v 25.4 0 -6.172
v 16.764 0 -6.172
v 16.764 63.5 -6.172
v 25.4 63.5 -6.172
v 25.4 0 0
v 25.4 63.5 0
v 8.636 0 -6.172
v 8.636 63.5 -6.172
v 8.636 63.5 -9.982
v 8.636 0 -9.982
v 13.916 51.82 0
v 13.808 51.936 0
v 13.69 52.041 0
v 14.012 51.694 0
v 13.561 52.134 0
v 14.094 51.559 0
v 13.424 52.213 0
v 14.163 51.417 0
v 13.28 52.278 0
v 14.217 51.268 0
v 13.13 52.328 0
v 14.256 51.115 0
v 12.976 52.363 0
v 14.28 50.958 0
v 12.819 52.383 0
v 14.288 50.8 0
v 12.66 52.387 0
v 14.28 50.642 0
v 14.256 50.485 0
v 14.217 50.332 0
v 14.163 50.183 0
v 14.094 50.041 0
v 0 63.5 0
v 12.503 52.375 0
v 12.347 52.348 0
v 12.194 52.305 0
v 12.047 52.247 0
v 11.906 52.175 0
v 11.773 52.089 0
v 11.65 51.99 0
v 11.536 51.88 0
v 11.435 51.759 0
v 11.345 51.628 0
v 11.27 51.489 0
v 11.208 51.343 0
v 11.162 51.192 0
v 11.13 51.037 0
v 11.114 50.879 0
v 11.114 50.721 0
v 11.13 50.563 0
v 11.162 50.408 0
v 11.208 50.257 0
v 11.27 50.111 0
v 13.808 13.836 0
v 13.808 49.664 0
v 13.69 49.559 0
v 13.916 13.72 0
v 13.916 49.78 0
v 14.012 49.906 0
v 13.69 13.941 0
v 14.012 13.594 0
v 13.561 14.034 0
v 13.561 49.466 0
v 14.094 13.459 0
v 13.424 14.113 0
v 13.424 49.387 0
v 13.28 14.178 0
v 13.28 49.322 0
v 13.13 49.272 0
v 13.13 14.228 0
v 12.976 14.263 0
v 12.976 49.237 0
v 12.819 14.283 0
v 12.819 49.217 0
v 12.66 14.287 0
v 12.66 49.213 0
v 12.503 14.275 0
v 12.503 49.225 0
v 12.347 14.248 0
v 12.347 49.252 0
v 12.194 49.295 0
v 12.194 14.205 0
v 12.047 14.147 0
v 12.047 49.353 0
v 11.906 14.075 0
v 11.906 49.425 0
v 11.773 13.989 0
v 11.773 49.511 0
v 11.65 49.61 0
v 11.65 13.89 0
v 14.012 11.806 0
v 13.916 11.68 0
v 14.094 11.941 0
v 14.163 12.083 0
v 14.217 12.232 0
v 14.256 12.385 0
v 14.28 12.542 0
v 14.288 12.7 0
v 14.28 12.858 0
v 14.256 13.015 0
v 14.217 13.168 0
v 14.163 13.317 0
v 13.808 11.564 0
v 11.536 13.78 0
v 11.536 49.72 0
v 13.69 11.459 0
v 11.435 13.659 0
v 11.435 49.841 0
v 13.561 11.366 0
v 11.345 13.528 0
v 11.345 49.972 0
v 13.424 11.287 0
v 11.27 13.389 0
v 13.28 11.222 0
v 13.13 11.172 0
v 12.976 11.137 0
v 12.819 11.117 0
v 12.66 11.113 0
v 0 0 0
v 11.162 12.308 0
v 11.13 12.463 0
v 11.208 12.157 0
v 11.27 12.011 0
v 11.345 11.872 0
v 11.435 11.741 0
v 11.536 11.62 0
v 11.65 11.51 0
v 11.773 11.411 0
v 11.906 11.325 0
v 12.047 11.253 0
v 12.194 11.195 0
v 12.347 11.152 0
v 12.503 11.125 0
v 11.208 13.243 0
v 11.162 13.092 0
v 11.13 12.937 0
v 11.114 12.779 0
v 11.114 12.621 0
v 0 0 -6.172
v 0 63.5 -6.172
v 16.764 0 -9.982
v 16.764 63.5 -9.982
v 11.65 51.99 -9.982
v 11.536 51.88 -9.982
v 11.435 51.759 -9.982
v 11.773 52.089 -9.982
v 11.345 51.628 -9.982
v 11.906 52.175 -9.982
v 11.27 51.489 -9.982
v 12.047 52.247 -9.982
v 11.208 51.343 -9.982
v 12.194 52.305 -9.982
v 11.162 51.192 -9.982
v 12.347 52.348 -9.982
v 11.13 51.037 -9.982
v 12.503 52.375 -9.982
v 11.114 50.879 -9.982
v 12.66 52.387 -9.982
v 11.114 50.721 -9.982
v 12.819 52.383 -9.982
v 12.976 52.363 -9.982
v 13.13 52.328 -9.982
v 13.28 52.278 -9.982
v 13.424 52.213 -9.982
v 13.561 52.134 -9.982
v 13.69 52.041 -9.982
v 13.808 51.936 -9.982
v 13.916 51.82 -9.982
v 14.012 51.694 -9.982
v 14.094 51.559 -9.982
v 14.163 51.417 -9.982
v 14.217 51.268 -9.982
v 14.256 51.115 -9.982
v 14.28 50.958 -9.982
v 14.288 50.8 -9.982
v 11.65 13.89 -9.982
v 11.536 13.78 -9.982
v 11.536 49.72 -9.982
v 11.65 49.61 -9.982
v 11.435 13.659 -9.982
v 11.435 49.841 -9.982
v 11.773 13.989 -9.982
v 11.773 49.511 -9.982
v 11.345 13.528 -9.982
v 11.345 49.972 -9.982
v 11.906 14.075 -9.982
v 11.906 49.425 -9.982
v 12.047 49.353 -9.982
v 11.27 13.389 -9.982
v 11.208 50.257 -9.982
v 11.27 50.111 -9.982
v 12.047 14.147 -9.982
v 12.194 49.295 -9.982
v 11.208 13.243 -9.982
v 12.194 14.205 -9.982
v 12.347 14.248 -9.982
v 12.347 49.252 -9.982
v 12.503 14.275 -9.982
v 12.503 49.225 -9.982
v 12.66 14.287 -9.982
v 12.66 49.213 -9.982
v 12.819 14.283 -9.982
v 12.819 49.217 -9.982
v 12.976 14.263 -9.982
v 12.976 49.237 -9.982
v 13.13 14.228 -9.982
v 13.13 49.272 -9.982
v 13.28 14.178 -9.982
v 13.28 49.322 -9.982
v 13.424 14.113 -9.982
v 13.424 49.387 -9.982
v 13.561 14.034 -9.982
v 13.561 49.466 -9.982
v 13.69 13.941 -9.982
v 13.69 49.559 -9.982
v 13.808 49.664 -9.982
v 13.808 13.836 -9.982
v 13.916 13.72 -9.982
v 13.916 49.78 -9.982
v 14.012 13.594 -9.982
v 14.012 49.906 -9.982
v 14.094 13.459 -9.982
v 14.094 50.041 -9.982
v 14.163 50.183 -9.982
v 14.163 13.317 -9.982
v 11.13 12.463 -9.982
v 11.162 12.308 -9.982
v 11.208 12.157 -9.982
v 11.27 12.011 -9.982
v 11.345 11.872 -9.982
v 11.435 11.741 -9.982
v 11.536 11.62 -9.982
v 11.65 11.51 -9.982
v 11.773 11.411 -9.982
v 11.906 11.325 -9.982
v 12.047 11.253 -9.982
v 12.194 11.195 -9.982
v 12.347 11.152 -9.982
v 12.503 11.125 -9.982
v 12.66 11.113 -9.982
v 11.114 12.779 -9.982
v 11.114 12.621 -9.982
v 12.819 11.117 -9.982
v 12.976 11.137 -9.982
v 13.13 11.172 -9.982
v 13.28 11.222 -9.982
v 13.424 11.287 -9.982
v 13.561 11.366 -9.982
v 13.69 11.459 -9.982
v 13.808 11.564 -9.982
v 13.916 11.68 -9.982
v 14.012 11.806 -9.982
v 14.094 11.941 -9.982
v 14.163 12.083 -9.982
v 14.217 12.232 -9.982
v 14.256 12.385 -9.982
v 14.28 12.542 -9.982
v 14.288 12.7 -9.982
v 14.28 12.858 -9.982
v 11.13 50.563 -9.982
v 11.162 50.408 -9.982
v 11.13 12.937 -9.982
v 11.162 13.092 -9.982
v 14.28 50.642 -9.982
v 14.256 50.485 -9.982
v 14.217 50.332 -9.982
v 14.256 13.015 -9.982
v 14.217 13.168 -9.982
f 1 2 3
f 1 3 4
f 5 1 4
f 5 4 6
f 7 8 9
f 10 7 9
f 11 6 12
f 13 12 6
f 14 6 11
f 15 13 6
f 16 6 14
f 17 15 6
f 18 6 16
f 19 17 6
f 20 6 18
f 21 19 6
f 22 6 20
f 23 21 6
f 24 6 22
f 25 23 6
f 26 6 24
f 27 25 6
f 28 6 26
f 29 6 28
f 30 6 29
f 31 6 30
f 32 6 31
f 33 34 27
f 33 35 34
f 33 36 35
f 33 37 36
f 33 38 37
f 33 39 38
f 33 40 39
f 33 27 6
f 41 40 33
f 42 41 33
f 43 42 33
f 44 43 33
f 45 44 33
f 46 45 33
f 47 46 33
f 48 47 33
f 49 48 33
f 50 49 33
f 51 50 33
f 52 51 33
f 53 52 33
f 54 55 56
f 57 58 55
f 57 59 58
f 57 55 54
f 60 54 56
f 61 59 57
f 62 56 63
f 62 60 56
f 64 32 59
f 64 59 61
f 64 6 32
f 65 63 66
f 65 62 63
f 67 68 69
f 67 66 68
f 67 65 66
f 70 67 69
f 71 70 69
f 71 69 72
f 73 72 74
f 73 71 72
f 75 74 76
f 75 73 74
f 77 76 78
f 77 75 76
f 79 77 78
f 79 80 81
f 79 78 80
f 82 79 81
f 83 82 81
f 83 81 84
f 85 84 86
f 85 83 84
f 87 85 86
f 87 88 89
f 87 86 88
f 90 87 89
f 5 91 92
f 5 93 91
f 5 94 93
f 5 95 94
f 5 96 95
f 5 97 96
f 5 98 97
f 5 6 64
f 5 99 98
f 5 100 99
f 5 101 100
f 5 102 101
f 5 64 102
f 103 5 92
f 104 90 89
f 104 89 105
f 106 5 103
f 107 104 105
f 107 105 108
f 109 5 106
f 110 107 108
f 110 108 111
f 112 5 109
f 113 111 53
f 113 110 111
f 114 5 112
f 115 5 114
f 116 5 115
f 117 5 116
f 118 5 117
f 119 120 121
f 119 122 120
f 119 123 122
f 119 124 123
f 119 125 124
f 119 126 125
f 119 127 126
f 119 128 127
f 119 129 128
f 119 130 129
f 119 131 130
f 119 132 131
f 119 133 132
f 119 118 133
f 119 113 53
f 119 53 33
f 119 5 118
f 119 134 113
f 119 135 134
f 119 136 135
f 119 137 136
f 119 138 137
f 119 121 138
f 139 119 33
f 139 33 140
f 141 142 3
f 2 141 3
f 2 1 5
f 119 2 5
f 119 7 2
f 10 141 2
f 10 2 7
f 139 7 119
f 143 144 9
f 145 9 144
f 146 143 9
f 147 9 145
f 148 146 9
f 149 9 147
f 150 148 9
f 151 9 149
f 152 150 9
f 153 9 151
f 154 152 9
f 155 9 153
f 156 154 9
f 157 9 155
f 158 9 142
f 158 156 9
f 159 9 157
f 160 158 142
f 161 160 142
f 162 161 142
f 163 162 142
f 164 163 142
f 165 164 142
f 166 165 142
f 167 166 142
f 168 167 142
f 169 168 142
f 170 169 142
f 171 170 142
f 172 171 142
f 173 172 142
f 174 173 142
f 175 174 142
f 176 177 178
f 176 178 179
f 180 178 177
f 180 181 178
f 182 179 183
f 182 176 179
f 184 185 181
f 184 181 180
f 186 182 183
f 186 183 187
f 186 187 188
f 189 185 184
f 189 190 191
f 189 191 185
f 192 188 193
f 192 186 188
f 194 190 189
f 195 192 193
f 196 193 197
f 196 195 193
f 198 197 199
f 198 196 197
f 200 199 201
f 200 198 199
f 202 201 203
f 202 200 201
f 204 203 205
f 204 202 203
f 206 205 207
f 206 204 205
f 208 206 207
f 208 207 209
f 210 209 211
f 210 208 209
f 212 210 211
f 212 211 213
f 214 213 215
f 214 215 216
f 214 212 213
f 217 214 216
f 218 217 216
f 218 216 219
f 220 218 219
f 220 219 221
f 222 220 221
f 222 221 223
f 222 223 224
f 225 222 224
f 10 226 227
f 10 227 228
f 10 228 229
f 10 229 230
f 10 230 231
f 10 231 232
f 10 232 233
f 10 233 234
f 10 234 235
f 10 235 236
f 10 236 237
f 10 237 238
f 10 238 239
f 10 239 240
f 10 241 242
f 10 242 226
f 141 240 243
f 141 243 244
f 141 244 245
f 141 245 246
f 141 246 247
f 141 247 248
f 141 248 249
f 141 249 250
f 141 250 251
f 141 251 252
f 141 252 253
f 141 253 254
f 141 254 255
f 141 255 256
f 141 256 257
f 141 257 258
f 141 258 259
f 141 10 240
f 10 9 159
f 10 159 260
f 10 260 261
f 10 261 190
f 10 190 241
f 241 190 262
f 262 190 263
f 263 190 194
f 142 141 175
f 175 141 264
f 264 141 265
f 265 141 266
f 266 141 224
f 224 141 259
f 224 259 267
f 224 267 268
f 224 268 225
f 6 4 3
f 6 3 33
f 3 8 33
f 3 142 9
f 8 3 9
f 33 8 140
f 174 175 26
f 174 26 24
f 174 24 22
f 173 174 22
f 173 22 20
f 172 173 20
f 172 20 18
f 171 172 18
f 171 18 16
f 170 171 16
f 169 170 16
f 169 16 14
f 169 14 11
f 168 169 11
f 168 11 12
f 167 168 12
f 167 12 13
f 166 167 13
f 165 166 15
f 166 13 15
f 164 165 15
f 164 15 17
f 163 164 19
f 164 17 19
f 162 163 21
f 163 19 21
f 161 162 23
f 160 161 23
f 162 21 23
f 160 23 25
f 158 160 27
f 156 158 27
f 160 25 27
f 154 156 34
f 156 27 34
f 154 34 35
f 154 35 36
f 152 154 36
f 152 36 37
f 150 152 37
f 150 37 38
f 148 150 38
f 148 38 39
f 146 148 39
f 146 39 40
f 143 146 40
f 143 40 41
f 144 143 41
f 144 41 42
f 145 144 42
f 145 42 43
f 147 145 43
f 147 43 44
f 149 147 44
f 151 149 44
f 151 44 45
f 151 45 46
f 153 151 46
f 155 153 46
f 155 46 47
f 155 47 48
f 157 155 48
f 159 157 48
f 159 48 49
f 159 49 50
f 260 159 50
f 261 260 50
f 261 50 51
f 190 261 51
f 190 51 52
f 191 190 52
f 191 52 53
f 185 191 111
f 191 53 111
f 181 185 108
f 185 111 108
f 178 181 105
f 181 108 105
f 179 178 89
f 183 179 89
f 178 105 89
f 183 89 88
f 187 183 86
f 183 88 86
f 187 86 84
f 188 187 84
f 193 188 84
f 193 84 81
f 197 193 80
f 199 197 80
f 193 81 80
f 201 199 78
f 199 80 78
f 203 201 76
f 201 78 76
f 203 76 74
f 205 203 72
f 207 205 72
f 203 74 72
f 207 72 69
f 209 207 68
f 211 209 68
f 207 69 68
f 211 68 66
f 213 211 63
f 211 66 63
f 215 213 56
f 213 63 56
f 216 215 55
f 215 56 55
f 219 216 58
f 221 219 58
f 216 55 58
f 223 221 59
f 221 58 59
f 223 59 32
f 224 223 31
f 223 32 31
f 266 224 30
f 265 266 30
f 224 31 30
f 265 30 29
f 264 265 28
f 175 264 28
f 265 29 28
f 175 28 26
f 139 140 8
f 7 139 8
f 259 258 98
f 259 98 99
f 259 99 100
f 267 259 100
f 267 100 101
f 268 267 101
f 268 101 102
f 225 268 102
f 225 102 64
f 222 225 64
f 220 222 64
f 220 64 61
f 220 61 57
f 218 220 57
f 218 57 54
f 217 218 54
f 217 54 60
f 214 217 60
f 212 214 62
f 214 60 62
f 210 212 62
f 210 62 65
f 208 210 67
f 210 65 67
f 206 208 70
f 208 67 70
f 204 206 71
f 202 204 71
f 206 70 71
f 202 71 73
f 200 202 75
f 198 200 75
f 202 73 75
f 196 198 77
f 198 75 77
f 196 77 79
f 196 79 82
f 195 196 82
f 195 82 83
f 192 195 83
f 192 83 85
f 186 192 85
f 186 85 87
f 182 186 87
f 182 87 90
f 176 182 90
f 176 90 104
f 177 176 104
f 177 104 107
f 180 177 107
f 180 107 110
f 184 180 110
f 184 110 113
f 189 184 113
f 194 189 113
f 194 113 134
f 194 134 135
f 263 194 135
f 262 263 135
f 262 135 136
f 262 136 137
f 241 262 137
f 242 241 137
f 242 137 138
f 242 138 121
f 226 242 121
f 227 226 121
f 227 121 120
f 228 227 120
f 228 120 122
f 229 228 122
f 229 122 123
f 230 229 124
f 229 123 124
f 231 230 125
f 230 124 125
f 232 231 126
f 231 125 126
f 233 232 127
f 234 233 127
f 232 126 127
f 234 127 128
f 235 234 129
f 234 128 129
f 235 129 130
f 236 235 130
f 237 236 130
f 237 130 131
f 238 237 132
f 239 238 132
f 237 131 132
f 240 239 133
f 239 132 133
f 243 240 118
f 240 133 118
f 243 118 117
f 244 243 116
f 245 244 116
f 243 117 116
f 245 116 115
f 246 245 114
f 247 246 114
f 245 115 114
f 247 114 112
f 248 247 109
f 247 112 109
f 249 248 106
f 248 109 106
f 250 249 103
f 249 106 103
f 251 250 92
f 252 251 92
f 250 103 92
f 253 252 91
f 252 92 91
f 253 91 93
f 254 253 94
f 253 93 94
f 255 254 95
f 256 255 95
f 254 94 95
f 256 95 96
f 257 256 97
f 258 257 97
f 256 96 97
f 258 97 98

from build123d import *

# Parameters (mm, degrees)
BOSS_EXTRUDE1_DEPTH = 63.5
SKETCH3_R           = 1.5875
CUT_EXTRUDE1_DEPTH  = 63.5


with BuildPart() as part:
    # Sketch2 → Boss-Extrude1 (new body)
    with BuildSketch(Plane(origin=(0, 0, 0), x_dir=(1, 0, 0), z_dir=(0, 1, 0))):
        Polygon((16.764, 6.1722), (25.4, 6.1722), (25.4, 0), (0, 0), (0, 6.1722), (8.636, 6.1722), (8.636, 9.9822), (16.764, 9.9822), align=None)
    extrude(amount=BOSS_EXTRUDE1_DEPTH)

    # Sketch3 → Cut-Extrude1 (cut)
    with BuildSketch(Plane.XY):
        with Locations((12.7, 50.8)):
            Circle(SKETCH3_R)
        with Locations((12.7, 12.7)):
            Circle(SKETCH3_R)
    extrude(amount=-CUT_EXTRUDE1_DEPTH, mode=Mode.SUBTRACT)


solid = part.part
